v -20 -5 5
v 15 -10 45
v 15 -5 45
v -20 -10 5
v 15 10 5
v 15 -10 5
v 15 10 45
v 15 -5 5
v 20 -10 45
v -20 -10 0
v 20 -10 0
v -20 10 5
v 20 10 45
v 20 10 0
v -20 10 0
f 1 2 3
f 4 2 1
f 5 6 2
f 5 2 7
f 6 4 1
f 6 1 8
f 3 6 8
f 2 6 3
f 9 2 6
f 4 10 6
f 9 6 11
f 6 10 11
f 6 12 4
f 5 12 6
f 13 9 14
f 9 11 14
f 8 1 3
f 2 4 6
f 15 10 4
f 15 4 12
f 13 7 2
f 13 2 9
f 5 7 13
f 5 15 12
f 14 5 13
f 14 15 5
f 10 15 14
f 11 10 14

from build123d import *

# Parameters (mm, degrees)
F0_W     = 40
F0_H     = 20
F1_DEPTH = 5
F2_W     = 5
F2_H     = 20
F3_DEPTH = 40
F5_DEPTH = 5


with BuildPart() as f1:
    # F0 (on Top) → F1 (new body)
    with BuildSketch(Plane.XY):
        Rectangle(F0_W, F0_H)
    extrude(amount=F1_DEPTH)

    # F2 (on face) → F3 (join)
    with BuildSketch(Plane.XY.offset(5)):
        with Locations((17.5, 0)):
            Rectangle(F2_W, F2_H)
    extrude(amount=F3_DEPTH)


with BuildPart() as f5:
    # F4 (on face) → F5 (new body)
    with BuildSketch(Plane.XZ.offset(10)):
        Polygon((15, 5), (15, 45), (-20, 5), align=None)
    extrude(amount=-F5_DEPTH)


solid = Compound([f1.part, f5.part])
